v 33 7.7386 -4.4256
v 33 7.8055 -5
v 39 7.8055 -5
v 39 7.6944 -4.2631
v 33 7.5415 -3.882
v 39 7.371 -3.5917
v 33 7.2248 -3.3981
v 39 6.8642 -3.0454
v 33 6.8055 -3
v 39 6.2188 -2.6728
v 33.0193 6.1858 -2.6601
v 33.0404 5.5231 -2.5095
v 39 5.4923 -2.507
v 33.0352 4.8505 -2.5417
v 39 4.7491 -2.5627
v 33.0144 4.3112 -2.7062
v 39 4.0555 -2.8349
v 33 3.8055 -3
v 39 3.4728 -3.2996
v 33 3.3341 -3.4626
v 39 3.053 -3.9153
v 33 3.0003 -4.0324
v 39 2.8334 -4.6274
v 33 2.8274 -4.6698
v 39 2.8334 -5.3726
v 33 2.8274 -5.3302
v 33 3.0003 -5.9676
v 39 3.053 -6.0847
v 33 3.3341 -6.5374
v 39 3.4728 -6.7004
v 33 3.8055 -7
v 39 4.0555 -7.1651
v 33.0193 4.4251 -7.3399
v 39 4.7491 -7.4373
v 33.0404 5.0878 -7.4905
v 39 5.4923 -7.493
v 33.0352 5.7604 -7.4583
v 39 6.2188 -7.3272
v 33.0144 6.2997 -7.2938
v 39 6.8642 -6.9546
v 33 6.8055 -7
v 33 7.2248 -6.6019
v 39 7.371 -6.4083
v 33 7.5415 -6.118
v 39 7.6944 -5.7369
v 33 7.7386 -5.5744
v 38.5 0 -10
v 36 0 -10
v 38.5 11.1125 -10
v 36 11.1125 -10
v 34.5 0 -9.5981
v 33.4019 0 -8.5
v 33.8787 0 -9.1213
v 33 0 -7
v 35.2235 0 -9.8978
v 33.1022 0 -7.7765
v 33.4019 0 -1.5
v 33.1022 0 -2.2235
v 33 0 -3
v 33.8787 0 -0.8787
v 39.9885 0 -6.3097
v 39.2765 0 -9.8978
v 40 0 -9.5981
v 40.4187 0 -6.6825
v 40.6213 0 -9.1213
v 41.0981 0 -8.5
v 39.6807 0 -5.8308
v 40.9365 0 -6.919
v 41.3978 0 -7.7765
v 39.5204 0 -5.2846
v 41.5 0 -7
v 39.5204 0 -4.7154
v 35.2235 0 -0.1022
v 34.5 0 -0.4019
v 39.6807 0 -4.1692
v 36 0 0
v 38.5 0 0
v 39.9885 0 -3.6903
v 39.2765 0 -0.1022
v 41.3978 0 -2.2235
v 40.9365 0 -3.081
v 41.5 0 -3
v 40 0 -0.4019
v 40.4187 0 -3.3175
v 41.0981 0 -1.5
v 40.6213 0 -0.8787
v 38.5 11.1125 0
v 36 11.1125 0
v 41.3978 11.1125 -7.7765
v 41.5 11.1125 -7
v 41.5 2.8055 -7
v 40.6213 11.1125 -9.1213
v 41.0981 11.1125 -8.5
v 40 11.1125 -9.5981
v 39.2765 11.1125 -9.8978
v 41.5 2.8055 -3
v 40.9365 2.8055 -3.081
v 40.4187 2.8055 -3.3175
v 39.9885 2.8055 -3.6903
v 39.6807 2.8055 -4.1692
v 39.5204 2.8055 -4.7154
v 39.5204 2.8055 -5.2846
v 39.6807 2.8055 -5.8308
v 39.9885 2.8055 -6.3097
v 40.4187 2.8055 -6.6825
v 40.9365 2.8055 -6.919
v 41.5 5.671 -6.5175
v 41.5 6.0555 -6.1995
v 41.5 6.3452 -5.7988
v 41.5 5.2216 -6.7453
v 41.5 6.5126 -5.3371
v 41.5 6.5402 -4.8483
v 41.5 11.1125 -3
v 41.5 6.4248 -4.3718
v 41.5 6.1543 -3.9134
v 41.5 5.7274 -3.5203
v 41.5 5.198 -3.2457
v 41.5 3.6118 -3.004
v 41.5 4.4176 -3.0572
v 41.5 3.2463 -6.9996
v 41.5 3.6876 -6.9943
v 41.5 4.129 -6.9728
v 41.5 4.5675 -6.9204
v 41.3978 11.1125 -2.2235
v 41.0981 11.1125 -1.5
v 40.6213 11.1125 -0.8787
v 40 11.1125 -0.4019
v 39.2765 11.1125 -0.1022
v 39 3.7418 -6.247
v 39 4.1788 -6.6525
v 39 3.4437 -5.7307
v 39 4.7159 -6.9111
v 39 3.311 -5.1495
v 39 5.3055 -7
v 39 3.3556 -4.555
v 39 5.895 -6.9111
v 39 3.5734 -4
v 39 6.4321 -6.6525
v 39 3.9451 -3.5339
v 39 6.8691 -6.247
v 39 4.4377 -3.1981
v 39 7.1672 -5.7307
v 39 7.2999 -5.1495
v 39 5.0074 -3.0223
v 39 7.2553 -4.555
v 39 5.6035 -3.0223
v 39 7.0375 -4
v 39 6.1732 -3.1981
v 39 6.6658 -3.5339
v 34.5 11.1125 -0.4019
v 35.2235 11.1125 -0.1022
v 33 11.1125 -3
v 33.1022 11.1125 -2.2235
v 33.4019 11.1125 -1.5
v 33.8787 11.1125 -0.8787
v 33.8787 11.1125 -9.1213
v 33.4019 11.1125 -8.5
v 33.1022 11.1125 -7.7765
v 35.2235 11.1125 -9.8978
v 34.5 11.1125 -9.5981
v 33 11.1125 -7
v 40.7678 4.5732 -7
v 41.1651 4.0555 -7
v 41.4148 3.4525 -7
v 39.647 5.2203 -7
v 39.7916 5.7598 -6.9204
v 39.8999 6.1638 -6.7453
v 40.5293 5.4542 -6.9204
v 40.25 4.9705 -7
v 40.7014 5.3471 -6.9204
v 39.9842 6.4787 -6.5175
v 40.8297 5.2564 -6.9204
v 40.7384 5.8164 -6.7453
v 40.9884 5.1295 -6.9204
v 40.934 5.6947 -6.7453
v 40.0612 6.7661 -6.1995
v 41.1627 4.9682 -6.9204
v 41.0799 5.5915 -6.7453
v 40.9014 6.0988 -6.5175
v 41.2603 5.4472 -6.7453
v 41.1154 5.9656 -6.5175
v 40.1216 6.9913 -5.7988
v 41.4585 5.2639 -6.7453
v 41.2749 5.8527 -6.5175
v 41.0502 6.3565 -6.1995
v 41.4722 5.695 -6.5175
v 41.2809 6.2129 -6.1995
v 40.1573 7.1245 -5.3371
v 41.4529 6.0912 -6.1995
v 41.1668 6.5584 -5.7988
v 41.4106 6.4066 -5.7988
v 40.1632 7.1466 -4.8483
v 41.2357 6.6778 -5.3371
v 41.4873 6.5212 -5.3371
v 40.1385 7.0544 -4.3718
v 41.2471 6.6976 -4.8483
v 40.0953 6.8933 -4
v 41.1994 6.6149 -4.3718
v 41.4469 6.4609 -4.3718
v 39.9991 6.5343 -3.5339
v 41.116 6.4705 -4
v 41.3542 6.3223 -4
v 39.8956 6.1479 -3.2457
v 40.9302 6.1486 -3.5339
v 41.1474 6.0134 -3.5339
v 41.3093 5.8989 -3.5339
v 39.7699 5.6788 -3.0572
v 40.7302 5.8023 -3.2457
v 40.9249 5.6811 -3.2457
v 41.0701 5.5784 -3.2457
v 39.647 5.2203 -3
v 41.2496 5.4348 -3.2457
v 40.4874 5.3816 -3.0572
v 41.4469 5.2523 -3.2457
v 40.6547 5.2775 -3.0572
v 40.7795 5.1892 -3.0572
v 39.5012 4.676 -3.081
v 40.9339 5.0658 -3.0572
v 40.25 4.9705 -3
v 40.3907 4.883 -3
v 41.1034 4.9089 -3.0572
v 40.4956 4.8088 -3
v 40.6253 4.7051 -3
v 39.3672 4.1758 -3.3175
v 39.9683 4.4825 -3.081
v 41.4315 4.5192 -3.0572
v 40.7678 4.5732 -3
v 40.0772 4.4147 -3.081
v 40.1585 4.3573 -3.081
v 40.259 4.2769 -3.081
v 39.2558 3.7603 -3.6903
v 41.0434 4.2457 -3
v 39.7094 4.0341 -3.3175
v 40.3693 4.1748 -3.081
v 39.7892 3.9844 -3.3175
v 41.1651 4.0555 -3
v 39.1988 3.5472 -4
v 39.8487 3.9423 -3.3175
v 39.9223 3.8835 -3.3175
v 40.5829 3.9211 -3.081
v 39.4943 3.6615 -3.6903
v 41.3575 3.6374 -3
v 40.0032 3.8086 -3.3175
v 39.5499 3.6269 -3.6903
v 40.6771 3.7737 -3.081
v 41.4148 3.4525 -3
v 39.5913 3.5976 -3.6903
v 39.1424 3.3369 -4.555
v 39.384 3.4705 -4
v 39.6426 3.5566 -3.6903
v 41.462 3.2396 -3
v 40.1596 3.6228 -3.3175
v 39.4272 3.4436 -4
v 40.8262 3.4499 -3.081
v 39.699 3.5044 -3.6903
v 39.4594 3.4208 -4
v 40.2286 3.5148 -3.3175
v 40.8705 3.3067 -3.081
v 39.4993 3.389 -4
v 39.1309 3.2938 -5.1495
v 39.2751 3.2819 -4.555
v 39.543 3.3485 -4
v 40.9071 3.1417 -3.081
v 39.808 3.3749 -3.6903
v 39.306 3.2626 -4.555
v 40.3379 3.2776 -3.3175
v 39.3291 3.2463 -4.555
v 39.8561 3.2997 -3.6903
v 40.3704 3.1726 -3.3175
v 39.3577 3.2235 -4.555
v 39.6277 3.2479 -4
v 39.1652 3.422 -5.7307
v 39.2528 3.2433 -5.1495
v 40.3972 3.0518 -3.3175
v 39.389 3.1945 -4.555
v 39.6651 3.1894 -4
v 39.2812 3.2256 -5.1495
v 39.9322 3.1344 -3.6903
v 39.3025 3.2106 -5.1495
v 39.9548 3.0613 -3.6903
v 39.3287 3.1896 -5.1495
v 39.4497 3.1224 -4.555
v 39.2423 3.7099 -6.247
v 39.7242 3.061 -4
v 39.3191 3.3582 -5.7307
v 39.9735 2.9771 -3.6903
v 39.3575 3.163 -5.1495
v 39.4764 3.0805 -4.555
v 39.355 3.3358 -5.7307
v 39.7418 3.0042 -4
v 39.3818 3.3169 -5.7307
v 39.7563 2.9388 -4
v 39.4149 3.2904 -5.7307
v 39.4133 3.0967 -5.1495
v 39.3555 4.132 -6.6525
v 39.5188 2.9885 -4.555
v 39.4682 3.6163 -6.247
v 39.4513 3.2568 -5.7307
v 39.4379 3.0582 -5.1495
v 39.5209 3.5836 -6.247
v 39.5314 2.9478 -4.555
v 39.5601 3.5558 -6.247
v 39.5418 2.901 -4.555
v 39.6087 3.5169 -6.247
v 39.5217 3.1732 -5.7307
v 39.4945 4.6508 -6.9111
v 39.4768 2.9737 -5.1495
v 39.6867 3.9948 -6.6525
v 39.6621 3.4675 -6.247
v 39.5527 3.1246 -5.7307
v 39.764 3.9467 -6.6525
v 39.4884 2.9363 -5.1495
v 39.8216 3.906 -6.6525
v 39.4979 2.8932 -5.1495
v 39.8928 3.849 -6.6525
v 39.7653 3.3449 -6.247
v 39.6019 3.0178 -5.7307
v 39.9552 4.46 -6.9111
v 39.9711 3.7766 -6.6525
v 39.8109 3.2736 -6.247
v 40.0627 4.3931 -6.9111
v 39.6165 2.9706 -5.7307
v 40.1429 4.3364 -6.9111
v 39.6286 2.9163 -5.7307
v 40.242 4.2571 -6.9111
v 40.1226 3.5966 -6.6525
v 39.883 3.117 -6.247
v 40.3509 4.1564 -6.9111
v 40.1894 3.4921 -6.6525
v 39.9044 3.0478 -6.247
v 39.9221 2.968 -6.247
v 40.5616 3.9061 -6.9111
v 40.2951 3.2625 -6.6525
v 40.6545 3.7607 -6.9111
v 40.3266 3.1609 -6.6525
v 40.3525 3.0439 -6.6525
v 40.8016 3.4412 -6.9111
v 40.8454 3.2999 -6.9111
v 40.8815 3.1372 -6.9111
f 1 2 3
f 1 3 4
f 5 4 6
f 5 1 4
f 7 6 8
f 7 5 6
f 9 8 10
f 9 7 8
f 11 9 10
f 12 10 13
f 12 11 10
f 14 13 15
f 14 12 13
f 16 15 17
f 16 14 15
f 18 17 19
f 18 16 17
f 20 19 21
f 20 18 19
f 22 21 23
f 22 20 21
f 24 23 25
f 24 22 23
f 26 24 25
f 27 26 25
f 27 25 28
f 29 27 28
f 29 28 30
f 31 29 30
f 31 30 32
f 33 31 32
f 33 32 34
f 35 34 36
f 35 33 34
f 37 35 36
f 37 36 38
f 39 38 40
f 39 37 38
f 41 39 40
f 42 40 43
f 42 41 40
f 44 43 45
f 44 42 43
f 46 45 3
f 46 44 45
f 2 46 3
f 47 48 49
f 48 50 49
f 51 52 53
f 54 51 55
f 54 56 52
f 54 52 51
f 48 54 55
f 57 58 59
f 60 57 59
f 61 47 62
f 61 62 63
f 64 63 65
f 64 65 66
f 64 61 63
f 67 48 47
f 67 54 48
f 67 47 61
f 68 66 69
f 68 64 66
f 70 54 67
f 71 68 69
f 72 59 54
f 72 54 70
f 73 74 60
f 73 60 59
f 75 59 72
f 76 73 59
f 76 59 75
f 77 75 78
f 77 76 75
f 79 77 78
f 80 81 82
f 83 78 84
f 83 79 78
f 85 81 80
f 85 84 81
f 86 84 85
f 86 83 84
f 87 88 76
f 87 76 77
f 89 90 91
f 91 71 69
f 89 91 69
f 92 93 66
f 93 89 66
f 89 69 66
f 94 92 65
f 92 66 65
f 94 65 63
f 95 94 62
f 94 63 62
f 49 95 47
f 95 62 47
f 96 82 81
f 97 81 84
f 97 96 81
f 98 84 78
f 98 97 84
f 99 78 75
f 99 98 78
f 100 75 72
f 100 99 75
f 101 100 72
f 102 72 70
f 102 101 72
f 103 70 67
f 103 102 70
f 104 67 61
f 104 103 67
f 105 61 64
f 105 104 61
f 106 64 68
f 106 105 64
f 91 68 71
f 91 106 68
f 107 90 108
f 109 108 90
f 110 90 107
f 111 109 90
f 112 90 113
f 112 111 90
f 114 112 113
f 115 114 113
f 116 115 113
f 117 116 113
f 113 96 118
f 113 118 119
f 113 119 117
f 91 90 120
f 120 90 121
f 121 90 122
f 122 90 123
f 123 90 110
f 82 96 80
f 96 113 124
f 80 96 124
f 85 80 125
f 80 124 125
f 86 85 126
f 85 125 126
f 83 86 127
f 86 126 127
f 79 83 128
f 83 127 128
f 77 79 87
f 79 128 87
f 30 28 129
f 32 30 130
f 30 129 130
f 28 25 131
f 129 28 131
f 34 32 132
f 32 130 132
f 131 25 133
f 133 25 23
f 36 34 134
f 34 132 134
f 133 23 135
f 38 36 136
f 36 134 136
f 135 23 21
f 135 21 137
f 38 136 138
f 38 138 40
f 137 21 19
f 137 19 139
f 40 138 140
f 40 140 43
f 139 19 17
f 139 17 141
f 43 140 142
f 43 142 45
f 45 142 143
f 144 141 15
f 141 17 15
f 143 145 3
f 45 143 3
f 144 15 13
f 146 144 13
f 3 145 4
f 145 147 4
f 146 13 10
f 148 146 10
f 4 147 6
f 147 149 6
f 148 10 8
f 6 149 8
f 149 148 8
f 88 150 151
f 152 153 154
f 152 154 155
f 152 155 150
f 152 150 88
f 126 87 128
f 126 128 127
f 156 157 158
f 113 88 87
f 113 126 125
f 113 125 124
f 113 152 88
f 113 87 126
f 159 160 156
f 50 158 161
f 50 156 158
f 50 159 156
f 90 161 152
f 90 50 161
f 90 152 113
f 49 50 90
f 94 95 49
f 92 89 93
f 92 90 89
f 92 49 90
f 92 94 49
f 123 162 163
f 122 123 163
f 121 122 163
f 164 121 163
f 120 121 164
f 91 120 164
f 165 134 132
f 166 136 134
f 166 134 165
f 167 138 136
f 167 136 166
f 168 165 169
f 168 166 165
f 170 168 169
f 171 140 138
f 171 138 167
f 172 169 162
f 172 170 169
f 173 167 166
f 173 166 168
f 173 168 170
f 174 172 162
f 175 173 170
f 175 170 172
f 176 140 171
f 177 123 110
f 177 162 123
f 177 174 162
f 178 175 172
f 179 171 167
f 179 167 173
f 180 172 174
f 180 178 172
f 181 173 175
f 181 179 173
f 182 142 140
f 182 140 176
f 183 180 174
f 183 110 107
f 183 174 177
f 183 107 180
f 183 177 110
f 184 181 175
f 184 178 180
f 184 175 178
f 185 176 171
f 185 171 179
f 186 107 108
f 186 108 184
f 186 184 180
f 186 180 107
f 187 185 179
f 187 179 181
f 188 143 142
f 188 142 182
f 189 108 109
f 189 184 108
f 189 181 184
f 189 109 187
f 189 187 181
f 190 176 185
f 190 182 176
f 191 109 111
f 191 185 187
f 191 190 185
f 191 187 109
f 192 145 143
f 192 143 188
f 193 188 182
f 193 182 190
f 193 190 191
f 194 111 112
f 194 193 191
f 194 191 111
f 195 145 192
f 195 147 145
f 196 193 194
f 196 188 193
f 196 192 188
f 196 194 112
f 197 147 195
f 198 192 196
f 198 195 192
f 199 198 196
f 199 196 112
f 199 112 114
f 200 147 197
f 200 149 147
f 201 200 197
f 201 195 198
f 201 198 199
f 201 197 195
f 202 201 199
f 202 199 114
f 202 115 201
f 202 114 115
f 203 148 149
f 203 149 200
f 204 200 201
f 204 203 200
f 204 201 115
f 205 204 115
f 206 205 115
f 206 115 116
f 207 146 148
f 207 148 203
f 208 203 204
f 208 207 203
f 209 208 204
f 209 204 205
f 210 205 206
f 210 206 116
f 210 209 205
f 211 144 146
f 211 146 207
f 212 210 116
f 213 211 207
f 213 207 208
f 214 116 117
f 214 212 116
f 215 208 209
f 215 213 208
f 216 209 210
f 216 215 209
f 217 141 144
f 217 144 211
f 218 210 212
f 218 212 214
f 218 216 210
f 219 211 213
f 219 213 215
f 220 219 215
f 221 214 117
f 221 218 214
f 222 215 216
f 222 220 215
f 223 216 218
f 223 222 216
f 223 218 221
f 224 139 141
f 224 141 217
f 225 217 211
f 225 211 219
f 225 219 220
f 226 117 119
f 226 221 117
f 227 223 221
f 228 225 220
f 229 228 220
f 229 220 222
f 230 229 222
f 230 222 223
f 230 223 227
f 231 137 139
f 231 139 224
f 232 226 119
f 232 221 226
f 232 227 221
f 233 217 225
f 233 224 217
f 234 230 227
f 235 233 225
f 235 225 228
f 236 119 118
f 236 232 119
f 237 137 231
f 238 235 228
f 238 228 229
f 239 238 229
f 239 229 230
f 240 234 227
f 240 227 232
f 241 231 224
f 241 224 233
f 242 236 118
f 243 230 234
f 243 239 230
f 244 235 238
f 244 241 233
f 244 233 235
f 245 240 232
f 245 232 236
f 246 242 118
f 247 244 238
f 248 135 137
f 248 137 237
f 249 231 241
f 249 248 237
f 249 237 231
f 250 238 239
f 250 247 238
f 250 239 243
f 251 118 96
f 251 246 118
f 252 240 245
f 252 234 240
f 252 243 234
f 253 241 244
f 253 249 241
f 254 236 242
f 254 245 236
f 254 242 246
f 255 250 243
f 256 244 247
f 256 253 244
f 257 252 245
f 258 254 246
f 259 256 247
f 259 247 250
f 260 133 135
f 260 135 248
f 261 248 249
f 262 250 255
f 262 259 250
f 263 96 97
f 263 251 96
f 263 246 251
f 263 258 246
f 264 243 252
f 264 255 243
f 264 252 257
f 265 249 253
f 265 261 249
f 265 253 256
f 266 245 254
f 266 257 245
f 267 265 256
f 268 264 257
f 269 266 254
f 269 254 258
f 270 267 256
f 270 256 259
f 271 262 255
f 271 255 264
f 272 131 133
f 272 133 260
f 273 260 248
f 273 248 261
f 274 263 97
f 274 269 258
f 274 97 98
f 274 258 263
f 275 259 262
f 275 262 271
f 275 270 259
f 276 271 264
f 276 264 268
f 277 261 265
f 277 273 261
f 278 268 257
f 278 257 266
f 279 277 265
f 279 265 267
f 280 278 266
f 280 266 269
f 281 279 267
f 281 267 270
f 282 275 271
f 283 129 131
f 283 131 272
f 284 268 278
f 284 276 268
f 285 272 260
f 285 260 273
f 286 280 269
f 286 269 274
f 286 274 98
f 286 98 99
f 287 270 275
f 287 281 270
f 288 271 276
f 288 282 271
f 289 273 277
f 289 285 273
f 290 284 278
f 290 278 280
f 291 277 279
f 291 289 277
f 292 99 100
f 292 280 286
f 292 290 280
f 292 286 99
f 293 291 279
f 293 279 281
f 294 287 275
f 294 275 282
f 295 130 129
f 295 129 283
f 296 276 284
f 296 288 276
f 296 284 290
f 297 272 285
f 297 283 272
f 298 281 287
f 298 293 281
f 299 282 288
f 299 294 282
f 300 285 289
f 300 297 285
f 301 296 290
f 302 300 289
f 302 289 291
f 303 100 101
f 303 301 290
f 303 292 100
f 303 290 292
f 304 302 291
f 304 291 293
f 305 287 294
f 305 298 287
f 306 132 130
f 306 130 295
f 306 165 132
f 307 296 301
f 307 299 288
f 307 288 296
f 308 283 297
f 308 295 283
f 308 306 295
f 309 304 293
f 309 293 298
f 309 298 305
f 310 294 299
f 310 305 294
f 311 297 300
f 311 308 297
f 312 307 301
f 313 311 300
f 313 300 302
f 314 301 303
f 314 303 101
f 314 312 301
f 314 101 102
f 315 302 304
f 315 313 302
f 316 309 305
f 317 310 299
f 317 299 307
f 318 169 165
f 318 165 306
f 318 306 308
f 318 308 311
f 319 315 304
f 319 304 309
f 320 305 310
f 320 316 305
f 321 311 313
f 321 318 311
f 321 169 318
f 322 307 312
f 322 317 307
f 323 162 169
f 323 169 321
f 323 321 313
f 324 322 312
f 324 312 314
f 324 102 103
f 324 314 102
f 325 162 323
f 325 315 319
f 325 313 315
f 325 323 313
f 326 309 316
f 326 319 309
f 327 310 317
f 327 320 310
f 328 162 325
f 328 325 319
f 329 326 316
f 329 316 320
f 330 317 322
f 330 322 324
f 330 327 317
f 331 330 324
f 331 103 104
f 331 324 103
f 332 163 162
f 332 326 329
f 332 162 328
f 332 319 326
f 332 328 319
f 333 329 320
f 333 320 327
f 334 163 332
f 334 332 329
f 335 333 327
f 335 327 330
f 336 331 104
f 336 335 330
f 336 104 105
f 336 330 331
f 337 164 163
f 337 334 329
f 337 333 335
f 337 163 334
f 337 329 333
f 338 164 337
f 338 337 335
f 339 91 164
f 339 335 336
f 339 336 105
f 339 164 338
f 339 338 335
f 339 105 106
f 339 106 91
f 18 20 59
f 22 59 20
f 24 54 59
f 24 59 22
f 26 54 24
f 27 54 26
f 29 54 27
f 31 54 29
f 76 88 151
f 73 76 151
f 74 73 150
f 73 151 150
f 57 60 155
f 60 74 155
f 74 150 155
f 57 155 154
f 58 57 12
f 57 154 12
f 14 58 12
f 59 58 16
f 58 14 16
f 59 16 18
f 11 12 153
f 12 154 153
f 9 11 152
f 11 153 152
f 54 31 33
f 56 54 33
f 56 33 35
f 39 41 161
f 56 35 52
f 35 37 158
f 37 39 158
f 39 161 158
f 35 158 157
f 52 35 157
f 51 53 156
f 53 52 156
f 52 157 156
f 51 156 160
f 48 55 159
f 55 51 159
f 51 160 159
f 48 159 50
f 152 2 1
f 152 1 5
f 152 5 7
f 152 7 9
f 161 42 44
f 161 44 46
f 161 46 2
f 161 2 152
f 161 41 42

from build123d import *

# Parameters (mm, degrees)
BOSS_EXTRUDE1_DEPTH     = 10
CUT_EXTRUDE2_DEPTH      = 50.456381745
CUT_EXTRUDE2_DEPTH_BACK = 50.456381745
SKETCH3_R               = 2.5
CUT_EXTRUDE3_DEPTH      = 6
SKETCH4_R               = 2
CUT_REVOLVE1_ANGLE      = 90
SKETCH5_R               = 2
CUT_EXTRUDE4_DEPTH      = 2.805452299
FILLET1_R               = 5
SKETCH6_W               = 10
SKETCH6_H               = 29.685485307
CUT_EXTRUDE5_DEPTH      = 33
SKETCH7_W               = 19.76767366
SKETCH7_H               = 10
CUT_EXTRUDE6_DEPTH      = 48.418220859
SKETCH8_W               = 3.5
SKETCH8_H               = 11.210857043
CUT_EXTRUDE7_DEPTH      = 48.41822072
FILLET2_R               = 3


with BuildPart() as part:
    # Sketch1 → Boss-Extrude1 (new body)
    with BuildSketch(Plane.XY):
        with BuildLine():
            Line((0, 0), (45, 0))
            Line((45, 0), (45, 11.1125))
            Line((45, 11.1125), (35, 11.1125))
            add(Edge.make_bspline(
                [(10, 11.1125), (14.576625097, 20.181995974), (30.423374903, 20.181995974), (35, 11.1125)],
                knots=[0, 0, 0, 0, 1, 1, 1, 1], degree=3))
            Line((10, 11.1125), (0, 11.1125))
            Line((0, 11.1125), (0, 0))
        make_face()
    extrude(amount=-BOSS_EXTRUDE1_DEPTH)

    # Sketch2 → Cut-Extrude2 (cut, two sides: drawn at the far end of the back side and taken through both)
    with BuildSketch(Plane.XY.offset(-CUT_EXTRUDE2_DEPTH_BACK)):
        with BuildLine():
            Line((33, 0), (33, 10.610904597))
            add(Edge.make_bspline(
                [(33, 10.610904597), (32.518518069, 11.455367364), (31.27134268, 12.982349636), (27.931157473, 15.20113612), (22.5, 16.390279221), (17.068842527, 15.20113612), (13.72865732, 12.982349636), (12.481481931, 11.455367364), (12, 10.610904597)],
                knots=[0.018308459, 0.018308459, 0.018308459, 0.018308459, 0.138731344, 0.25915423, 0.5, 0.74084577, 0.861268656, 0.981691541, 0.981691541, 0.981691541, 0.981691541], degree=3))
            Line((12, 10.610904597), (12, 0))
            Line((12, 0), (33, 0))
        make_face()
    extrude(amount=CUT_EXTRUDE2_DEPTH + CUT_EXTRUDE2_DEPTH_BACK, mode=Mode.SUBTRACT)

    # Sketch3 → Cut-Extrude3 (cut)
    with BuildSketch(Plane(origin=(12, 0, 0), x_dir=(0, 0, -1), z_dir=(1, 0, 0))):
        with Locations(Location((5, 5.305452299, 0), (0, 0, 90))):
            Circle(SKETCH3_R)
    cut_extrude3 = extrude(amount=-CUT_EXTRUDE3_DEPTH, mode=Mode.SUBTRACT)

    # Sketch4 → Cut-Revolve1 (revolve, cut)
    with BuildSketch(Plane(origin=(6, 0, 0), x_dir=(0, 0, -1), z_dir=(1, 0, 0))):
        with Locations((5, 5.305452299)):
            Circle(SKETCH4_R)
    cut_revolve1 = revolve(axis=Axis((6, 2.805452299, -5), (0, 0, 1)), revolution_arc=CUT_REVOLVE1_ANGLE, mode=Mode.SUBTRACT)

    # Sketch5 → Cut-Extrude4 (cut)
    with BuildSketch(Plane(origin=(0, 2.805452299, 0), x_dir=(1, 0, 0), z_dir=(0, 1, 0))):
        with Locations(Location((3.5, 5, 0), (0, 0, 180))):
            Circle(SKETCH5_R)
    cut_extrude4 = extrude(amount=-CUT_EXTRUDE4_DEPTH, mode=Mode.SUBTRACT)

    # Mirror1: Cut-Extrude3, Cut-Revolve1, Cut-Extrude4 across plane
    add(cut_extrude3.mirror(Plane(origin=(22.5, 0, 0), x_dir=(0, 0, 1), z_dir=(1, 0, 0))), mode=Mode.SUBTRACT)
    add(cut_revolve1.mirror(Plane(origin=(22.5, 0, 0), x_dir=(0, 0, 1), z_dir=(1, 0, 0))), mode=Mode.SUBTRACT)
    add(cut_extrude4.mirror(Plane(origin=(22.5, 0, 0), x_dir=(0, 0, 1), z_dir=(1, 0, 0))), mode=Mode.SUBTRACT)

    # Fillet1
    fillet1_edges = [part.edges().sort_by_distance(p)[0] for p in [
        (10, 11.1125, -5),
        (35, 11.1125, -5),
        (33, 10.610904597, -5),
        (12, 10.610904597, -5),
    ]]
    fillet(fillet1_edges, radius=FILLET1_R)

    # Sketch6 → Cut-Extrude5 (cut)
    with BuildSketch(Plane.ZY):
        with Locations((-5, 14.842742654)):
            Rectangle(SKETCH6_W, SKETCH6_H)
    extrude(amount=-CUT_EXTRUDE5_DEPTH, mode=Mode.SUBTRACT)

    # Sketch7 → Cut-Extrude6 (cut, through all)
    with BuildSketch(Plane(origin=(0, 11.1125, 0), x_dir=(1, 0, 0), z_dir=(0, 1, 0))):
        with Locations((35.11616317, 5)):
            Rectangle(SKETCH7_W, SKETCH7_H)
    extrude(amount=CUT_EXTRUDE6_DEPTH, mode=Mode.SUBTRACT)

    # Sketch8 → Cut-Extrude7 (cut, through all)
    with BuildSketch(Plane.XZ):
        with Locations((43.25, -4.394571478)):
            Rectangle(SKETCH8_W, SKETCH8_H)
    extrude(amount=-CUT_EXTRUDE7_DEPTH, mode=Mode.SUBTRACT)

    # Fillet2
    # the kernel refuses this fillet: 3 mm, written as the material it takes off along each edge
    with BuildSketch(Plane(origin=(33, 18.6125, -10), x_dir=(0, 0, 1), z_dir=(0, -1, 0)), Plane(origin=(33, 18.6125, 0), x_dir=(1, 0, 0), z_dir=(0, -1, 0)), Plane(origin=(41.5, -7.5, -10), x_dir=(0, 0, 1), z_dir=(0, 1, 0))) as fillet2_piece_1:
        with BuildLine():
            CenterArc((FILLET2_R, -FILLET2_R), FILLET2_R, 90, 90)
            Line((0, -FILLET2_R), (0, 0))
            Line((0, 0), (FILLET2_R, 0))
        make_face()
    extrude(amount=26.1125, mode=Mode.SUBTRACT)
    with BuildSketch(Plane(origin=(41.5, 18.6125, 0), x_dir=(-1, 0, 0), z_dir=(0, -1, 0))) as fillet2_piece_2:
        with BuildLine():
            CenterArc((FILLET2_R, FILLET2_R), FILLET2_R, 180, 90)
            Line((0, FILLET2_R), (0, 0))
            Line((0, 0), (FILLET2_R, 0))
        make_face()
    extrude(amount=26.1125, mode=Mode.SUBTRACT)


solid = part.part
